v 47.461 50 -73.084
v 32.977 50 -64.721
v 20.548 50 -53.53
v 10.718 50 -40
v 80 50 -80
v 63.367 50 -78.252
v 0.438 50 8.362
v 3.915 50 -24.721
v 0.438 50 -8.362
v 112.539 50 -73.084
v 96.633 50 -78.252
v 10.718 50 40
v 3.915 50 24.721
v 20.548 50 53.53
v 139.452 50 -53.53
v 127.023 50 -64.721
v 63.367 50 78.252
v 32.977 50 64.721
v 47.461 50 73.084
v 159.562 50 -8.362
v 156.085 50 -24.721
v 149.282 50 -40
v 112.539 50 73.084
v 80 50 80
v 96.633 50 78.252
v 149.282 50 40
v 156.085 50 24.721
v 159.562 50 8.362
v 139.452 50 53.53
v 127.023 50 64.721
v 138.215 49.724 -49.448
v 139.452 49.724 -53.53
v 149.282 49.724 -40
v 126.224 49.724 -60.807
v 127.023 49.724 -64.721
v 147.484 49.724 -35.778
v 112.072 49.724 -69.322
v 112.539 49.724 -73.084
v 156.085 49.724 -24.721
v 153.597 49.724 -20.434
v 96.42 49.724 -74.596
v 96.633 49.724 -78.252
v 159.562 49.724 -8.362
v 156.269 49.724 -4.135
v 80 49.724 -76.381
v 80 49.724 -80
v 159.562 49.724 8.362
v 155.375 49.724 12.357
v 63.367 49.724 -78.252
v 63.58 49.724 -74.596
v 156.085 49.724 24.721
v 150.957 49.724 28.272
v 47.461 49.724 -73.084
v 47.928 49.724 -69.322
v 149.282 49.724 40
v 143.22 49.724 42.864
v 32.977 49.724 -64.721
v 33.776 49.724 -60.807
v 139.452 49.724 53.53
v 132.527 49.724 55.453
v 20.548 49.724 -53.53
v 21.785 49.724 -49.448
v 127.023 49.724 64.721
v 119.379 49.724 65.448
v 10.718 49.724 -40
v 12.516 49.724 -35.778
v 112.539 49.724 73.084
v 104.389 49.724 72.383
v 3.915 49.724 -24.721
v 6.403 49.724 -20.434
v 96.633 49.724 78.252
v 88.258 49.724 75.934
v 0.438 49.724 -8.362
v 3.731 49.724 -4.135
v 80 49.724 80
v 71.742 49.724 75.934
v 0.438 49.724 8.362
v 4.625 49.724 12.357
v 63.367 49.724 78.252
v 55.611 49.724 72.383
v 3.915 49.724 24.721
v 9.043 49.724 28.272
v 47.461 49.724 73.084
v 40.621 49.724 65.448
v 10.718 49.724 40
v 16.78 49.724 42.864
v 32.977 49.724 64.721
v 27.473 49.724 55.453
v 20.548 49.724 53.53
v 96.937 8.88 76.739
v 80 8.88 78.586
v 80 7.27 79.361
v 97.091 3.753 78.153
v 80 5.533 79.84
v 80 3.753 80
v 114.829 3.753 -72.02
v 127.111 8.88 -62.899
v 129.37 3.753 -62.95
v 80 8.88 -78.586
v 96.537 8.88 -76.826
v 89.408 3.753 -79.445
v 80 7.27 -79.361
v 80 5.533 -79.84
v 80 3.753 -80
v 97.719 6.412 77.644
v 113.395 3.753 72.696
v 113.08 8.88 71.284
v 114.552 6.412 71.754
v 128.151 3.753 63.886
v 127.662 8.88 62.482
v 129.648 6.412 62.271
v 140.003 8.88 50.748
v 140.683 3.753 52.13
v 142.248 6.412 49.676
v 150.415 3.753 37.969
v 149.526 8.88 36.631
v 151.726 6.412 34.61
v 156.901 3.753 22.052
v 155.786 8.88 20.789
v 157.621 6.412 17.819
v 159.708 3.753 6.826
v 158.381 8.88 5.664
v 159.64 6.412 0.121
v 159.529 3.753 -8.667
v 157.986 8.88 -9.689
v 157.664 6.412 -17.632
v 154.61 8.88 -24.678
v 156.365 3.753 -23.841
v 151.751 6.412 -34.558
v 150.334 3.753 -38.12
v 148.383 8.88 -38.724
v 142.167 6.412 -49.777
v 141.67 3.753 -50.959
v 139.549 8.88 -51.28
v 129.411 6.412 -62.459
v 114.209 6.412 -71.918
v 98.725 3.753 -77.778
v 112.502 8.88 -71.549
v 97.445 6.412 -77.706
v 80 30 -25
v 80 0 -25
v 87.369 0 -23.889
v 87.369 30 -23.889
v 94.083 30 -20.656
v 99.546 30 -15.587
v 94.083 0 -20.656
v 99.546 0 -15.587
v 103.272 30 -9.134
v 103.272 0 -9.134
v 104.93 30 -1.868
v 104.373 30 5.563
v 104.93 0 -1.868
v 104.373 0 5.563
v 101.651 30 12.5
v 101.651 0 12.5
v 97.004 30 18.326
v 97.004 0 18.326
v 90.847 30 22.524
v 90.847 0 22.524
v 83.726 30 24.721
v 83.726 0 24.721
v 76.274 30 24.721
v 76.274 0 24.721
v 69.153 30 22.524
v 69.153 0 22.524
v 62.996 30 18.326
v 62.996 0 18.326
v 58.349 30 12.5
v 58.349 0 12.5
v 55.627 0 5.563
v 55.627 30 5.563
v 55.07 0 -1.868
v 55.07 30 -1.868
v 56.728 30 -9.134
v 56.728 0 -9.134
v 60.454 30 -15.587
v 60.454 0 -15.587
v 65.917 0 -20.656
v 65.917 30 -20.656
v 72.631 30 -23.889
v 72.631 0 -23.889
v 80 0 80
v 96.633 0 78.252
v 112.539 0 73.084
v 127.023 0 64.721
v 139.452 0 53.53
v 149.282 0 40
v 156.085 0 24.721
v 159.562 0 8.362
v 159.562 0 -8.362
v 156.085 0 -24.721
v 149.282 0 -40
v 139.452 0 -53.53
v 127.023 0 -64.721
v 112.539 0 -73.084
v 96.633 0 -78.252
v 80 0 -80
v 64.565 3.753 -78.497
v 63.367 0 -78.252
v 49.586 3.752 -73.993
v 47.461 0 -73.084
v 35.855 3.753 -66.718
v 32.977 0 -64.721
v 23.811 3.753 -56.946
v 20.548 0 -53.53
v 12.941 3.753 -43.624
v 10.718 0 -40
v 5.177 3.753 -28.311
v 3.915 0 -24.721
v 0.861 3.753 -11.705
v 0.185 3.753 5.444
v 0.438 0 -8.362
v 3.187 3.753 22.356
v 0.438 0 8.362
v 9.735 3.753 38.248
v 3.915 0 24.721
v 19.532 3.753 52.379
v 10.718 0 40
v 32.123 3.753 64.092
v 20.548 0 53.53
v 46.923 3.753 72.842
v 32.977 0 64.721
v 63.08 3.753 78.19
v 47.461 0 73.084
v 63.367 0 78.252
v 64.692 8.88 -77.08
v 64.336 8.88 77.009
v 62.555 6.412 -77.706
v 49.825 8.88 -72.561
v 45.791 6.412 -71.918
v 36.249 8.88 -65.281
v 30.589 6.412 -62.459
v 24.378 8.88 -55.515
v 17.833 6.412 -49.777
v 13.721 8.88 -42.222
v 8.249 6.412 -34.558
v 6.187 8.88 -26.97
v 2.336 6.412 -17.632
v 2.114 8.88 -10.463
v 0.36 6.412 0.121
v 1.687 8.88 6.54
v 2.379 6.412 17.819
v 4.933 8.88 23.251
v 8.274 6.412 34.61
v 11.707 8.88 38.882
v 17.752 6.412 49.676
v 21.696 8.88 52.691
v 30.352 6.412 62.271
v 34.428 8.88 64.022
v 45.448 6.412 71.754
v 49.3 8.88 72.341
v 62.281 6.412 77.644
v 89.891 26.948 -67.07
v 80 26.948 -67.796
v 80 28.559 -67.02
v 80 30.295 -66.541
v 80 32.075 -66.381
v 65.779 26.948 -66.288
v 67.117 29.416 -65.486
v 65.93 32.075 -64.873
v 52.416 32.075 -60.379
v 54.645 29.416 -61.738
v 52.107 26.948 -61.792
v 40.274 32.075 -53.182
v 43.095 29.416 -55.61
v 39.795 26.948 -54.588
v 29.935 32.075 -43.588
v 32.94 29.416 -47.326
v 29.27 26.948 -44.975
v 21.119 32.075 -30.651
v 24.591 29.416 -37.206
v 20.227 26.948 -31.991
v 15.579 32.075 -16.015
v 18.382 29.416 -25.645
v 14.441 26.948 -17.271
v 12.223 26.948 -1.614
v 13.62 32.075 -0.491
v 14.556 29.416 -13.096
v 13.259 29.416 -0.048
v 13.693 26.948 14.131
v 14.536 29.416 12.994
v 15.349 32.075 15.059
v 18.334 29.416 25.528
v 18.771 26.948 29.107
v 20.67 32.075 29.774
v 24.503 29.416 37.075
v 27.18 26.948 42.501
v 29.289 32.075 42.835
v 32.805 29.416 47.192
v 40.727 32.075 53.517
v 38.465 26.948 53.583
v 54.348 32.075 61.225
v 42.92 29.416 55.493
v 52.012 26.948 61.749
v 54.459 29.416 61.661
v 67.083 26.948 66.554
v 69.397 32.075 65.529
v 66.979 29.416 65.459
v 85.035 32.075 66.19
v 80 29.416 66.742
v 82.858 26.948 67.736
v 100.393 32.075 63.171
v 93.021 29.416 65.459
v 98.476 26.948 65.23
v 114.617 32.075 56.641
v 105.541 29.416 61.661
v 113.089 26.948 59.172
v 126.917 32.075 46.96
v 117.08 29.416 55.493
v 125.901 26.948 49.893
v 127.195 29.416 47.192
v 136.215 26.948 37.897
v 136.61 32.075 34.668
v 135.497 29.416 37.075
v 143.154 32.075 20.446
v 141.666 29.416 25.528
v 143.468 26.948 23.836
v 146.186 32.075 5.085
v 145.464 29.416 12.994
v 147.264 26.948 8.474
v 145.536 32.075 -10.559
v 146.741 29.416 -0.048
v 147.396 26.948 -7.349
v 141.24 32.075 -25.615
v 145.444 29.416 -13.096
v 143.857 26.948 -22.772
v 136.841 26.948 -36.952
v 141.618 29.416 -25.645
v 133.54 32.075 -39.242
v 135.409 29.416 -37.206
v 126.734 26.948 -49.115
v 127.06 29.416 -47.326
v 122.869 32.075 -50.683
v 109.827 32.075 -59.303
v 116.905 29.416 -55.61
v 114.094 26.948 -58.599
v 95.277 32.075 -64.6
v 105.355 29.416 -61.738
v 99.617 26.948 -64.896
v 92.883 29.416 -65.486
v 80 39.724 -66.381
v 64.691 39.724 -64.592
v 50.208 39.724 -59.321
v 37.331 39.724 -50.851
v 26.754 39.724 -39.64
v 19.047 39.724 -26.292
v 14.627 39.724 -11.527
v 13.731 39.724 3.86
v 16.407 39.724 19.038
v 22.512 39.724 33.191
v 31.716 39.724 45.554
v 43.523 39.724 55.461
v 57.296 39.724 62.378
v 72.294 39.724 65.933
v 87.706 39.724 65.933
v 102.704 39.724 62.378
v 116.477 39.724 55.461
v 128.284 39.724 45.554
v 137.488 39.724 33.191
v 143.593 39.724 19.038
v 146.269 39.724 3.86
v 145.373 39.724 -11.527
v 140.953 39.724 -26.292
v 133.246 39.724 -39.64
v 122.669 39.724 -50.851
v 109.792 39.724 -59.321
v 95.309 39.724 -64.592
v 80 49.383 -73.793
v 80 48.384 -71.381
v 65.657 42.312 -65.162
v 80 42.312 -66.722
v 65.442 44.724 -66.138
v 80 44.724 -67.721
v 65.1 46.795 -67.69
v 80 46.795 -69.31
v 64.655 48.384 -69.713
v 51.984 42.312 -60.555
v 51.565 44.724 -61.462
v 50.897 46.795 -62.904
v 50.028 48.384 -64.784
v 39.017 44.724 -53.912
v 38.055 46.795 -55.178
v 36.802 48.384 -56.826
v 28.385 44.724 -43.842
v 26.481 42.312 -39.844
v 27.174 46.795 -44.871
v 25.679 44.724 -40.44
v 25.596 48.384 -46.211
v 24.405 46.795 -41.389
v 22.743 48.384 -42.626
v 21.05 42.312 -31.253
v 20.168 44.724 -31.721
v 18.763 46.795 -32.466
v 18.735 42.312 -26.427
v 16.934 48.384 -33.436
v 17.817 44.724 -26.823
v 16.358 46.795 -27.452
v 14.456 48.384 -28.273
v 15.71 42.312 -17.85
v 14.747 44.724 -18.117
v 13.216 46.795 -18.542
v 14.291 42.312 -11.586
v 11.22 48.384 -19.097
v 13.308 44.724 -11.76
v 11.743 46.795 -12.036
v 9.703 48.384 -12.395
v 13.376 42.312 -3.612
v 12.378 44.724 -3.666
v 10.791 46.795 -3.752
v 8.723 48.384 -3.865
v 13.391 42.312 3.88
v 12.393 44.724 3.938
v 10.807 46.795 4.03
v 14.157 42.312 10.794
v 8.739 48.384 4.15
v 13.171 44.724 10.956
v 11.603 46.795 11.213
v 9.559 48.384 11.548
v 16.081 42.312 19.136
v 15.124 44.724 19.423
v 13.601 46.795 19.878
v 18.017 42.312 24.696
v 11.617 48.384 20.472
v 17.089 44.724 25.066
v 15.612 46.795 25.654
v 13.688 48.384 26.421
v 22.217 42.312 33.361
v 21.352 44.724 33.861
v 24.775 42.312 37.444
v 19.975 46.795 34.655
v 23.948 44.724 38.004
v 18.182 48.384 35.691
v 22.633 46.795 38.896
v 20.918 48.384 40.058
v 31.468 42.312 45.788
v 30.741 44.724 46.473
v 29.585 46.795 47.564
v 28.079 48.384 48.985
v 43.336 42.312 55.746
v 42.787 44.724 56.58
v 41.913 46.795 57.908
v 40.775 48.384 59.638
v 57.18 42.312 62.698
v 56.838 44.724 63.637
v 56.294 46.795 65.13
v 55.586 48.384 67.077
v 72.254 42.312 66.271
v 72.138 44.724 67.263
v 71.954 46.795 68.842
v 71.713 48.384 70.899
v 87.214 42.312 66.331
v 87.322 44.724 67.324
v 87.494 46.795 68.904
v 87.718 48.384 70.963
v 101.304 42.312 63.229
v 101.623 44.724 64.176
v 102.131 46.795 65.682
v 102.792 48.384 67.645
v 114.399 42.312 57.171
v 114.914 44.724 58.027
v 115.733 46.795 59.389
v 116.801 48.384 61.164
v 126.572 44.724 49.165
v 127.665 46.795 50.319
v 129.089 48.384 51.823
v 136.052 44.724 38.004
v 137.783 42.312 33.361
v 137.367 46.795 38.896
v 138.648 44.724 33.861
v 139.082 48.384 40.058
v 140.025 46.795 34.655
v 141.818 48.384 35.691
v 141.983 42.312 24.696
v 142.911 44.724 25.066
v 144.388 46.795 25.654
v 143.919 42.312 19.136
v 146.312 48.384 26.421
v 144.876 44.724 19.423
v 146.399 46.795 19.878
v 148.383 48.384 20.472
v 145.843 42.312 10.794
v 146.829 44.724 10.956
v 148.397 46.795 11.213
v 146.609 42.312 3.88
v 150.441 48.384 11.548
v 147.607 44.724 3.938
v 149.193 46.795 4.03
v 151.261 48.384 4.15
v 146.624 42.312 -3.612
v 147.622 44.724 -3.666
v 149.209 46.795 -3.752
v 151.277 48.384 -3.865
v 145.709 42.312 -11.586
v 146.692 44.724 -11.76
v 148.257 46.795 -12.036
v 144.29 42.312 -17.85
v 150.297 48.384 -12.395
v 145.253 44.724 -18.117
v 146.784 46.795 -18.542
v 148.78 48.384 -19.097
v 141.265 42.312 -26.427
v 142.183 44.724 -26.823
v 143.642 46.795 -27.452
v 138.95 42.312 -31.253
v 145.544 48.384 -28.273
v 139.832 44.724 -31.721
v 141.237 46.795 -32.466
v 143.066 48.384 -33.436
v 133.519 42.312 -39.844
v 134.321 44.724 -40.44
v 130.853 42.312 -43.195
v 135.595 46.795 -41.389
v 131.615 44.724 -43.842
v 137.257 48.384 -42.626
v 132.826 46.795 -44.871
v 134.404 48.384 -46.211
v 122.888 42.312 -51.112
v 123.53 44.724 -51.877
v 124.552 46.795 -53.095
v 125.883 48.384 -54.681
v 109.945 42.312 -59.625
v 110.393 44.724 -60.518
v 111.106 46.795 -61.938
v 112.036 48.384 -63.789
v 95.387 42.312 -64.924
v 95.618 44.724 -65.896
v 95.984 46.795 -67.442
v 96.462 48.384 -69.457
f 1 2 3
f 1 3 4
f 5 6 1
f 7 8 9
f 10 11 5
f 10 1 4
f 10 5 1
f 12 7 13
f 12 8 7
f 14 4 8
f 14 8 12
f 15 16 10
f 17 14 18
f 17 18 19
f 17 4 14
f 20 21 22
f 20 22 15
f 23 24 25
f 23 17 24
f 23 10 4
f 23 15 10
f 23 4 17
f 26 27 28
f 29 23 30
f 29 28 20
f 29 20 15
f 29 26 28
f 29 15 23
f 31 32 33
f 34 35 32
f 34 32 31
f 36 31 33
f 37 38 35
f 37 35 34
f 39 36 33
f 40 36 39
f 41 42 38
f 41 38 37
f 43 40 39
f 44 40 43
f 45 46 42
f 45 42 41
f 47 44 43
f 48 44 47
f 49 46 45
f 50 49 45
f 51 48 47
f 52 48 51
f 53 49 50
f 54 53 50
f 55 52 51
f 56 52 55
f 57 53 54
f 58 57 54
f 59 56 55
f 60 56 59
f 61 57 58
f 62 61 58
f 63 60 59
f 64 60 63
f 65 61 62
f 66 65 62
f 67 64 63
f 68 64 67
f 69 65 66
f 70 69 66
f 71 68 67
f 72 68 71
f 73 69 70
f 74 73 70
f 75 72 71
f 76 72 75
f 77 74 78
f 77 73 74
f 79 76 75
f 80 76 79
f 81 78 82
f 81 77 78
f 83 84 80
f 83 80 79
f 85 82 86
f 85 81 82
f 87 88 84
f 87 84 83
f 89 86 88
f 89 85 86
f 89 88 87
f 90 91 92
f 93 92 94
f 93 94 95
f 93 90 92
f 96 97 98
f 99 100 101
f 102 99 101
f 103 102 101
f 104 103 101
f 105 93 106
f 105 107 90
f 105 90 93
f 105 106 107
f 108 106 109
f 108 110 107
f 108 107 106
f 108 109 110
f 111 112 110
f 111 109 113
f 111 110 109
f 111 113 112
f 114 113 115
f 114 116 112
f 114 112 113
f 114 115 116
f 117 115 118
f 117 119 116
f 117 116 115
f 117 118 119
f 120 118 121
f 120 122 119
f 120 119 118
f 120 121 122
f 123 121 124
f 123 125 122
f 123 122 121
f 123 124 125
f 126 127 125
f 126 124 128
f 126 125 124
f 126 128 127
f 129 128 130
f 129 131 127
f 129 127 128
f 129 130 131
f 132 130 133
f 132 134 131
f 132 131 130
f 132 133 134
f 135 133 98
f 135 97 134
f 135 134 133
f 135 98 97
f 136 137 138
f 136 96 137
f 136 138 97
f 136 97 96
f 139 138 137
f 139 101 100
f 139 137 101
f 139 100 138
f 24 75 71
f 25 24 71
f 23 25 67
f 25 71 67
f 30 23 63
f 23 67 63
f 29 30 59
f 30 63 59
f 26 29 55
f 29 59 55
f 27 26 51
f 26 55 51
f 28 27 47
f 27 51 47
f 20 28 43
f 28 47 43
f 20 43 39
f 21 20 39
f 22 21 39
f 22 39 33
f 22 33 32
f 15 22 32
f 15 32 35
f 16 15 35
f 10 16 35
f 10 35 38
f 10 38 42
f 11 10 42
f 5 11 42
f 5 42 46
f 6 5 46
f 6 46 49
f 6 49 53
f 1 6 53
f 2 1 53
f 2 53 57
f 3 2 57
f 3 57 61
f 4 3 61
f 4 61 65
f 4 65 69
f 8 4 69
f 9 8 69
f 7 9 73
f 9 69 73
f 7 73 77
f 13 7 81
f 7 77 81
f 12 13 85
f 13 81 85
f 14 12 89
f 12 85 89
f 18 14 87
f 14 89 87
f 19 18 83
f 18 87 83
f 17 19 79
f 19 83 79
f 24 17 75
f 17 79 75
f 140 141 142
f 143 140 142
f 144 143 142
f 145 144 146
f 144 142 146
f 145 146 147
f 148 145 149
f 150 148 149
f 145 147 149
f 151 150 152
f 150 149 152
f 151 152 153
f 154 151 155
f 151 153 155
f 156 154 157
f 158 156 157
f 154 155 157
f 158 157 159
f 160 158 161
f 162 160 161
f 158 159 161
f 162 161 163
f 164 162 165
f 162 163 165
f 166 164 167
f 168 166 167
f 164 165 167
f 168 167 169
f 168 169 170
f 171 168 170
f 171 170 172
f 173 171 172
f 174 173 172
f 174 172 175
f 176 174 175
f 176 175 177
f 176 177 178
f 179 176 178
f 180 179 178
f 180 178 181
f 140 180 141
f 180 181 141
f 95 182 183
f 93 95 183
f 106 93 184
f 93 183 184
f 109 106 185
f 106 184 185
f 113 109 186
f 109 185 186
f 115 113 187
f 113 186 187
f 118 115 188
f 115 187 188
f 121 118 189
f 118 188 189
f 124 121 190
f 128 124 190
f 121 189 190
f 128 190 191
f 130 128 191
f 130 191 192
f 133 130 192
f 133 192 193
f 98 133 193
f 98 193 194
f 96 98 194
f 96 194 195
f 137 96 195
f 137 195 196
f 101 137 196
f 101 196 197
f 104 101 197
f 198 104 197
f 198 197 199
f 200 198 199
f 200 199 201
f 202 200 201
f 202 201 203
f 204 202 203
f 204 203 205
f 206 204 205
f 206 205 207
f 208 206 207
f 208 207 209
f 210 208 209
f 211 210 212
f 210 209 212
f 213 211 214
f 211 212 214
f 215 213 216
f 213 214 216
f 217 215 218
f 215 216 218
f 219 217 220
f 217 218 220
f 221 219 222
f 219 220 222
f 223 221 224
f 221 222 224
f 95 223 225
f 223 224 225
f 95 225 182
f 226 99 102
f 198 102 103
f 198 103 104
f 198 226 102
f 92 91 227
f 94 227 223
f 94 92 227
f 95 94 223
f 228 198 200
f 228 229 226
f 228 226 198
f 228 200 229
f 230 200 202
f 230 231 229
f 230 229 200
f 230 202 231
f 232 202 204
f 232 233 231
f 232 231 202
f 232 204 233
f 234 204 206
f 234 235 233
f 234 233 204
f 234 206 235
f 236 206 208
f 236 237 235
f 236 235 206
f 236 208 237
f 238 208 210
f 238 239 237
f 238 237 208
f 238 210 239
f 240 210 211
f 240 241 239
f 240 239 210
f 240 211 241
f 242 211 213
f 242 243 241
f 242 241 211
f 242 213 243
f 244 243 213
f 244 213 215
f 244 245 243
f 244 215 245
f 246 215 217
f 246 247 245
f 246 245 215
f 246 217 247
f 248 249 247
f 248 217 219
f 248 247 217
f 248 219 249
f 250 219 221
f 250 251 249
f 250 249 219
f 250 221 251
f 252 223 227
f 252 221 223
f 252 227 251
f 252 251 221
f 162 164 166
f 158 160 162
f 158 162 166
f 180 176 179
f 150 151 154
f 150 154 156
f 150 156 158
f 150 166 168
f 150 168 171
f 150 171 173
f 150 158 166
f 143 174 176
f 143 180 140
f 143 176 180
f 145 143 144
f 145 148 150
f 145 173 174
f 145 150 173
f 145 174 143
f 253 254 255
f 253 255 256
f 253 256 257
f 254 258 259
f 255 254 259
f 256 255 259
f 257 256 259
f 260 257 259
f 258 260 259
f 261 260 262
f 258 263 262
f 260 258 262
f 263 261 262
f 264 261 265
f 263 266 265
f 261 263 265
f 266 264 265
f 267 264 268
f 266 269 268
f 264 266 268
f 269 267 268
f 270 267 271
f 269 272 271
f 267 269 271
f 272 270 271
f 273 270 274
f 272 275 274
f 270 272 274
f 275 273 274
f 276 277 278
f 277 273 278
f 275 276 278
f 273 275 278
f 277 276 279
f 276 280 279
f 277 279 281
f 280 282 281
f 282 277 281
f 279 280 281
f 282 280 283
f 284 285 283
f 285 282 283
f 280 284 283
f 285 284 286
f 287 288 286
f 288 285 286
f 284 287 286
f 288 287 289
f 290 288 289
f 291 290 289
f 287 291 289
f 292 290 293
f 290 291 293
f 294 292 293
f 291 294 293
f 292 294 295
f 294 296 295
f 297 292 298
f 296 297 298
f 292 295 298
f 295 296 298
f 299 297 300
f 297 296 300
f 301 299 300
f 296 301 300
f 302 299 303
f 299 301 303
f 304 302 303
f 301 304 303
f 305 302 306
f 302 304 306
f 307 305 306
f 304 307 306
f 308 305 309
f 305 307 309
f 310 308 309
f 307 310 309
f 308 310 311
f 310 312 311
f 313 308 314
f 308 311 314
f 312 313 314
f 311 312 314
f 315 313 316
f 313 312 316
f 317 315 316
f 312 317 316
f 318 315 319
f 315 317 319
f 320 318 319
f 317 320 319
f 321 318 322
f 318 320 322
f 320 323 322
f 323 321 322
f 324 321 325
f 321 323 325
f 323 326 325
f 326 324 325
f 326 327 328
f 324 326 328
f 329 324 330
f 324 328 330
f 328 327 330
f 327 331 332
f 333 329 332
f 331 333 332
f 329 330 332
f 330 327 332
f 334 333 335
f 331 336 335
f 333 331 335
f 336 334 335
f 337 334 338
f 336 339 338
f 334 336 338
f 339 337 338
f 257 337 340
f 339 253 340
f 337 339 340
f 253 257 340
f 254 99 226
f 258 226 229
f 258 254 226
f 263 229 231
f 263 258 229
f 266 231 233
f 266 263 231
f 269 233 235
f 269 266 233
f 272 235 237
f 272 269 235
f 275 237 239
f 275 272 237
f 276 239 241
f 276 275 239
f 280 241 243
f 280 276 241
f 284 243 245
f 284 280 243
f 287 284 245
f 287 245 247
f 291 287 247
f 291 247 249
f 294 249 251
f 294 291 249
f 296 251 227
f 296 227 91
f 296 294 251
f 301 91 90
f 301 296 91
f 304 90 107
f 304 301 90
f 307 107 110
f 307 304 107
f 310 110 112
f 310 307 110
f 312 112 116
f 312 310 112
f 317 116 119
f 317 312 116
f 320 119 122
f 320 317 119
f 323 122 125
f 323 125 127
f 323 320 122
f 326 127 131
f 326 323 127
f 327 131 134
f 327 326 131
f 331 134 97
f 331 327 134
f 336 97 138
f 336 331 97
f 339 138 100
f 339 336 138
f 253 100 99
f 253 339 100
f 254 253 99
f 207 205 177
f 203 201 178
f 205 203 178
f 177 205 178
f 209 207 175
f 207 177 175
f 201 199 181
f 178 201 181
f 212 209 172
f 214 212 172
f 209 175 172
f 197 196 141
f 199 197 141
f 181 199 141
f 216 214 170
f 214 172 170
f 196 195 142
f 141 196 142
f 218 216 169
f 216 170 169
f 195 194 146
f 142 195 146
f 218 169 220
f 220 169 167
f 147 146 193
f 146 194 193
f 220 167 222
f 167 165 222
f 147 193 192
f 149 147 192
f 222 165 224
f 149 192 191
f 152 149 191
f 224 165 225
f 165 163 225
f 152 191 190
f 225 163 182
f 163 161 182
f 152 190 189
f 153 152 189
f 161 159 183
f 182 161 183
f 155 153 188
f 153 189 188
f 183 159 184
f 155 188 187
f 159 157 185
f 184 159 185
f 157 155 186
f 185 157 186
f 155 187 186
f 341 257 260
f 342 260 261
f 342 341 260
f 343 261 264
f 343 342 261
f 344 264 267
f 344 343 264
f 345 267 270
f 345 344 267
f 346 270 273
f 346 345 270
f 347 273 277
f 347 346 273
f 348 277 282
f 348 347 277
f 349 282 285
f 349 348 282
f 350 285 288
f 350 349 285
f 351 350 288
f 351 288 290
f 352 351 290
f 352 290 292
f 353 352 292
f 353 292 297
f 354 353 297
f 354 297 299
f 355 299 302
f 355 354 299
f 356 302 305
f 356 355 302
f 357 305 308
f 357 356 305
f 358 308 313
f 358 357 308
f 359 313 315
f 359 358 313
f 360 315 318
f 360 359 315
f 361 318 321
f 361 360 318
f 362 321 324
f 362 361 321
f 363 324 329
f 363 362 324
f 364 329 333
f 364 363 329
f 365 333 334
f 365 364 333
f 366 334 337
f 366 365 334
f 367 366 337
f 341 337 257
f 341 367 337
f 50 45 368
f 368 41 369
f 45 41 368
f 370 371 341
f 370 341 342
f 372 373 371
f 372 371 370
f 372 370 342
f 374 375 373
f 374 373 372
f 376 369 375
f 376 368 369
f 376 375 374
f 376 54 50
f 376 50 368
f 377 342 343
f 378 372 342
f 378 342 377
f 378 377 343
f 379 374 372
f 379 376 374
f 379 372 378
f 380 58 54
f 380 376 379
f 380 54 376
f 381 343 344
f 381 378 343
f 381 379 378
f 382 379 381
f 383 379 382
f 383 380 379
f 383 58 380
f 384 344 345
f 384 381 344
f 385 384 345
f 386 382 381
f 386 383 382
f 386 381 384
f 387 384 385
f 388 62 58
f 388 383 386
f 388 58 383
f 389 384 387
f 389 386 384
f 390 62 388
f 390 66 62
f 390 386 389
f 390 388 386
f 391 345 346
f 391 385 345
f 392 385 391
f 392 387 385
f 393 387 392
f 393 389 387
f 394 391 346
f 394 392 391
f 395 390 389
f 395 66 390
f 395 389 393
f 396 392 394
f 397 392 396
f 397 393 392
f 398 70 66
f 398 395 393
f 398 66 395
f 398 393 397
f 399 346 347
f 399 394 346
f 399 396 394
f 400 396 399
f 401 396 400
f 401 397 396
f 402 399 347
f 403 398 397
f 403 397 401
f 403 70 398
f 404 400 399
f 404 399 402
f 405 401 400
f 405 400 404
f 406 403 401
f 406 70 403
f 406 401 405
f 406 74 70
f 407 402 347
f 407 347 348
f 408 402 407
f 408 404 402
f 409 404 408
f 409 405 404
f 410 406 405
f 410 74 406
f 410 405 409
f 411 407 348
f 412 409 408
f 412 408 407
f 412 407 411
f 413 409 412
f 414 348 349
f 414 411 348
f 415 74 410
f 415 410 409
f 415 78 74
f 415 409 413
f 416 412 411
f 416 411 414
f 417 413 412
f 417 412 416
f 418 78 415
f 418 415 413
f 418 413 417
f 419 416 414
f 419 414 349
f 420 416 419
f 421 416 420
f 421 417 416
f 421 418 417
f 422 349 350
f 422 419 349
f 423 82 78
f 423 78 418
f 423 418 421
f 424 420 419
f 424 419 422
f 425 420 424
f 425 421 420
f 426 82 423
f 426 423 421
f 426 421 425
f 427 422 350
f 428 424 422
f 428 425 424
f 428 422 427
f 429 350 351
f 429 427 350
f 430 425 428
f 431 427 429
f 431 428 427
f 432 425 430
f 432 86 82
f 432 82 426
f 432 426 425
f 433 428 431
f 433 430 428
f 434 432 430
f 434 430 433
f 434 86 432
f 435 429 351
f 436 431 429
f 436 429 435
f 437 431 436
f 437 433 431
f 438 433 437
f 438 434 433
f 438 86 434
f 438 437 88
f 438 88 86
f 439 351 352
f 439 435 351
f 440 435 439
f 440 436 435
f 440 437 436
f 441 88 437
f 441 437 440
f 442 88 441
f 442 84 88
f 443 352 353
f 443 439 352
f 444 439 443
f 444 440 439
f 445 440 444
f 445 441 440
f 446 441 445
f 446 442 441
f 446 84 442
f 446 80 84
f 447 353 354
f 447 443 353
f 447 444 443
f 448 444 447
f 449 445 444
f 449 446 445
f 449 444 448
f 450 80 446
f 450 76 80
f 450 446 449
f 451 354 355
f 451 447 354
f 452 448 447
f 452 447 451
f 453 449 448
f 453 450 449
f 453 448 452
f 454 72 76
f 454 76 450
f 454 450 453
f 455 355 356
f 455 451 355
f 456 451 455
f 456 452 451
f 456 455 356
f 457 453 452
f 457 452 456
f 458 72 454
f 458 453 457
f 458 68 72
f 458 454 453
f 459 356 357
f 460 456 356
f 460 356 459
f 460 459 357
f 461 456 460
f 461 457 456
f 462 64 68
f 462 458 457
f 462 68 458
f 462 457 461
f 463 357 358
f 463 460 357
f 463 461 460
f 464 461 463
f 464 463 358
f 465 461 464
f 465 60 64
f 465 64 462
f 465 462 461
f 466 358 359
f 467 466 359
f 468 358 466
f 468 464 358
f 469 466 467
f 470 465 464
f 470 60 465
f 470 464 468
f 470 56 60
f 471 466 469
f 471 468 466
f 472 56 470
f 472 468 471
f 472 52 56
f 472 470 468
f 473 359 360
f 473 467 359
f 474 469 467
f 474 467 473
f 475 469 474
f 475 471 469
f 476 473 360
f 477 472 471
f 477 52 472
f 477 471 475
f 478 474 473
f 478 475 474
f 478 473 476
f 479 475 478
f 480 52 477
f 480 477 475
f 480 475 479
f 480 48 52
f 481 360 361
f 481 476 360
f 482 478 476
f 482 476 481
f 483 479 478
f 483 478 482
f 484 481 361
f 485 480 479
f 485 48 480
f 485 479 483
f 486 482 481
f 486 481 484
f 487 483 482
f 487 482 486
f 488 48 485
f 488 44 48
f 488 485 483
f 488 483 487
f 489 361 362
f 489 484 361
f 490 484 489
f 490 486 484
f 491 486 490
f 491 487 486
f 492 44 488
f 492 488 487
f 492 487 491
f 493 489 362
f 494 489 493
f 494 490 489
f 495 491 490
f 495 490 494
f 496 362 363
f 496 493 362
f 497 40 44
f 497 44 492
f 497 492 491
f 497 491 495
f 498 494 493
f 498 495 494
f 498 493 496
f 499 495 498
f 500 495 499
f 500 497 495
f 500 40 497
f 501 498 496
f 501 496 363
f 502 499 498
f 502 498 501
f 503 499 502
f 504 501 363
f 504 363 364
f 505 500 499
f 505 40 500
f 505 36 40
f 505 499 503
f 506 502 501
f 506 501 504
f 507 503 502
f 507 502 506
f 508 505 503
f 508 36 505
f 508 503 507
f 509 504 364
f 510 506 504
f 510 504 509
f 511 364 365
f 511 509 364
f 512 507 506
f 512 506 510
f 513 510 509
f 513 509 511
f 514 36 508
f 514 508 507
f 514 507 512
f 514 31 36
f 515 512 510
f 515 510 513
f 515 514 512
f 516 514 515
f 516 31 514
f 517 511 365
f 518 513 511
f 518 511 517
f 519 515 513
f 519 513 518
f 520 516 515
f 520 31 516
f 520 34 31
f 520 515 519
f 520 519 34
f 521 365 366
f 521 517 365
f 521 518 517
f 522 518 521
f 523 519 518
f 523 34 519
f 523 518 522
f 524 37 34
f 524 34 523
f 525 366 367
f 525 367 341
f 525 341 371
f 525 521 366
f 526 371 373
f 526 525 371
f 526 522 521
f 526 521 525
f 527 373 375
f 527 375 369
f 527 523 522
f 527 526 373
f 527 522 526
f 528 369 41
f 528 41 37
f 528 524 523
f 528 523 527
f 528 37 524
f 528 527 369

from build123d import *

# Parameters (mm, degrees)
SKETCH12_R          = 80
BOSS_EXTRUDE1_DEPTH = 50
SKETCH13_R          = 25
CUT_EXTRUDE2_DEPTH  = 30
FILLET1_R           = 10
FILLET3_R           = 10
FILLET4_R           = 10


with BuildPart() as part:
    # Sketch12 → Boss-Extrude1 (new body)
    with BuildSketch(Plane(origin=(0, 0, 0), x_dir=(1, 0, 0), z_dir=(0, 1, 0))):
        with Locations(Location((80, 0, 0), (0, 0, 270))):
            Circle(SKETCH12_R)
    extrude(amount=BOSS_EXTRUDE1_DEPTH)

    # Sketch13 → Cut-Extrude2 (cut)
    with BuildSketch(Plane.XZ):
        with Locations(Location((80, 0, 0), (0, 0, 270))):
            Circle(SKETCH13_R)
    extrude(amount=-CUT_EXTRUDE2_DEPTH, mode=Mode.SUBTRACT)

    # Sketch14 → Cut-Revolve1 (revolve, cut)
    with BuildSketch(Plane.XY, mode=Mode.PRIVATE) as cut_revolve1_sk:
        Polygon((-7.132081461, 6.511492019), (0, 6.511492019), (13.618566057, 29.316874818), (13.618566057, 49.723955856), (-7.132081461, 49.723955856), align=None)
    revolve(cut_revolve1_sk.sketch.rotate(Axis((80, 0, 0), (0, 1, 0)), 270), axis=Axis((80, 0, 0), (0, 1, 0)), mode=Mode.SUBTRACT)

    # Fillet1
    fillet1_edges = [part.edges().sort_by_distance(p)[0] for p in [
        (80, 49.723955856, 66.381433943),
    ]]
    fillet(fillet1_edges, radius=FILLET1_R)

    # Fillet3
    fillet3_edges = [part.edges().sort_by_distance(p)[0] for p in [
        (160, 6.511492019, 0),
    ]]
    fillet(fillet3_edges, radius=FILLET3_R)

    # Fillet4
    fillet4_edges = [part.edges().sort_by_distance(p)[0] for p in [
        (80, 29.316874818, 66.381433943),
    ]]
    fillet(fillet4_edges, radius=FILLET4_R)


solid = part.part
